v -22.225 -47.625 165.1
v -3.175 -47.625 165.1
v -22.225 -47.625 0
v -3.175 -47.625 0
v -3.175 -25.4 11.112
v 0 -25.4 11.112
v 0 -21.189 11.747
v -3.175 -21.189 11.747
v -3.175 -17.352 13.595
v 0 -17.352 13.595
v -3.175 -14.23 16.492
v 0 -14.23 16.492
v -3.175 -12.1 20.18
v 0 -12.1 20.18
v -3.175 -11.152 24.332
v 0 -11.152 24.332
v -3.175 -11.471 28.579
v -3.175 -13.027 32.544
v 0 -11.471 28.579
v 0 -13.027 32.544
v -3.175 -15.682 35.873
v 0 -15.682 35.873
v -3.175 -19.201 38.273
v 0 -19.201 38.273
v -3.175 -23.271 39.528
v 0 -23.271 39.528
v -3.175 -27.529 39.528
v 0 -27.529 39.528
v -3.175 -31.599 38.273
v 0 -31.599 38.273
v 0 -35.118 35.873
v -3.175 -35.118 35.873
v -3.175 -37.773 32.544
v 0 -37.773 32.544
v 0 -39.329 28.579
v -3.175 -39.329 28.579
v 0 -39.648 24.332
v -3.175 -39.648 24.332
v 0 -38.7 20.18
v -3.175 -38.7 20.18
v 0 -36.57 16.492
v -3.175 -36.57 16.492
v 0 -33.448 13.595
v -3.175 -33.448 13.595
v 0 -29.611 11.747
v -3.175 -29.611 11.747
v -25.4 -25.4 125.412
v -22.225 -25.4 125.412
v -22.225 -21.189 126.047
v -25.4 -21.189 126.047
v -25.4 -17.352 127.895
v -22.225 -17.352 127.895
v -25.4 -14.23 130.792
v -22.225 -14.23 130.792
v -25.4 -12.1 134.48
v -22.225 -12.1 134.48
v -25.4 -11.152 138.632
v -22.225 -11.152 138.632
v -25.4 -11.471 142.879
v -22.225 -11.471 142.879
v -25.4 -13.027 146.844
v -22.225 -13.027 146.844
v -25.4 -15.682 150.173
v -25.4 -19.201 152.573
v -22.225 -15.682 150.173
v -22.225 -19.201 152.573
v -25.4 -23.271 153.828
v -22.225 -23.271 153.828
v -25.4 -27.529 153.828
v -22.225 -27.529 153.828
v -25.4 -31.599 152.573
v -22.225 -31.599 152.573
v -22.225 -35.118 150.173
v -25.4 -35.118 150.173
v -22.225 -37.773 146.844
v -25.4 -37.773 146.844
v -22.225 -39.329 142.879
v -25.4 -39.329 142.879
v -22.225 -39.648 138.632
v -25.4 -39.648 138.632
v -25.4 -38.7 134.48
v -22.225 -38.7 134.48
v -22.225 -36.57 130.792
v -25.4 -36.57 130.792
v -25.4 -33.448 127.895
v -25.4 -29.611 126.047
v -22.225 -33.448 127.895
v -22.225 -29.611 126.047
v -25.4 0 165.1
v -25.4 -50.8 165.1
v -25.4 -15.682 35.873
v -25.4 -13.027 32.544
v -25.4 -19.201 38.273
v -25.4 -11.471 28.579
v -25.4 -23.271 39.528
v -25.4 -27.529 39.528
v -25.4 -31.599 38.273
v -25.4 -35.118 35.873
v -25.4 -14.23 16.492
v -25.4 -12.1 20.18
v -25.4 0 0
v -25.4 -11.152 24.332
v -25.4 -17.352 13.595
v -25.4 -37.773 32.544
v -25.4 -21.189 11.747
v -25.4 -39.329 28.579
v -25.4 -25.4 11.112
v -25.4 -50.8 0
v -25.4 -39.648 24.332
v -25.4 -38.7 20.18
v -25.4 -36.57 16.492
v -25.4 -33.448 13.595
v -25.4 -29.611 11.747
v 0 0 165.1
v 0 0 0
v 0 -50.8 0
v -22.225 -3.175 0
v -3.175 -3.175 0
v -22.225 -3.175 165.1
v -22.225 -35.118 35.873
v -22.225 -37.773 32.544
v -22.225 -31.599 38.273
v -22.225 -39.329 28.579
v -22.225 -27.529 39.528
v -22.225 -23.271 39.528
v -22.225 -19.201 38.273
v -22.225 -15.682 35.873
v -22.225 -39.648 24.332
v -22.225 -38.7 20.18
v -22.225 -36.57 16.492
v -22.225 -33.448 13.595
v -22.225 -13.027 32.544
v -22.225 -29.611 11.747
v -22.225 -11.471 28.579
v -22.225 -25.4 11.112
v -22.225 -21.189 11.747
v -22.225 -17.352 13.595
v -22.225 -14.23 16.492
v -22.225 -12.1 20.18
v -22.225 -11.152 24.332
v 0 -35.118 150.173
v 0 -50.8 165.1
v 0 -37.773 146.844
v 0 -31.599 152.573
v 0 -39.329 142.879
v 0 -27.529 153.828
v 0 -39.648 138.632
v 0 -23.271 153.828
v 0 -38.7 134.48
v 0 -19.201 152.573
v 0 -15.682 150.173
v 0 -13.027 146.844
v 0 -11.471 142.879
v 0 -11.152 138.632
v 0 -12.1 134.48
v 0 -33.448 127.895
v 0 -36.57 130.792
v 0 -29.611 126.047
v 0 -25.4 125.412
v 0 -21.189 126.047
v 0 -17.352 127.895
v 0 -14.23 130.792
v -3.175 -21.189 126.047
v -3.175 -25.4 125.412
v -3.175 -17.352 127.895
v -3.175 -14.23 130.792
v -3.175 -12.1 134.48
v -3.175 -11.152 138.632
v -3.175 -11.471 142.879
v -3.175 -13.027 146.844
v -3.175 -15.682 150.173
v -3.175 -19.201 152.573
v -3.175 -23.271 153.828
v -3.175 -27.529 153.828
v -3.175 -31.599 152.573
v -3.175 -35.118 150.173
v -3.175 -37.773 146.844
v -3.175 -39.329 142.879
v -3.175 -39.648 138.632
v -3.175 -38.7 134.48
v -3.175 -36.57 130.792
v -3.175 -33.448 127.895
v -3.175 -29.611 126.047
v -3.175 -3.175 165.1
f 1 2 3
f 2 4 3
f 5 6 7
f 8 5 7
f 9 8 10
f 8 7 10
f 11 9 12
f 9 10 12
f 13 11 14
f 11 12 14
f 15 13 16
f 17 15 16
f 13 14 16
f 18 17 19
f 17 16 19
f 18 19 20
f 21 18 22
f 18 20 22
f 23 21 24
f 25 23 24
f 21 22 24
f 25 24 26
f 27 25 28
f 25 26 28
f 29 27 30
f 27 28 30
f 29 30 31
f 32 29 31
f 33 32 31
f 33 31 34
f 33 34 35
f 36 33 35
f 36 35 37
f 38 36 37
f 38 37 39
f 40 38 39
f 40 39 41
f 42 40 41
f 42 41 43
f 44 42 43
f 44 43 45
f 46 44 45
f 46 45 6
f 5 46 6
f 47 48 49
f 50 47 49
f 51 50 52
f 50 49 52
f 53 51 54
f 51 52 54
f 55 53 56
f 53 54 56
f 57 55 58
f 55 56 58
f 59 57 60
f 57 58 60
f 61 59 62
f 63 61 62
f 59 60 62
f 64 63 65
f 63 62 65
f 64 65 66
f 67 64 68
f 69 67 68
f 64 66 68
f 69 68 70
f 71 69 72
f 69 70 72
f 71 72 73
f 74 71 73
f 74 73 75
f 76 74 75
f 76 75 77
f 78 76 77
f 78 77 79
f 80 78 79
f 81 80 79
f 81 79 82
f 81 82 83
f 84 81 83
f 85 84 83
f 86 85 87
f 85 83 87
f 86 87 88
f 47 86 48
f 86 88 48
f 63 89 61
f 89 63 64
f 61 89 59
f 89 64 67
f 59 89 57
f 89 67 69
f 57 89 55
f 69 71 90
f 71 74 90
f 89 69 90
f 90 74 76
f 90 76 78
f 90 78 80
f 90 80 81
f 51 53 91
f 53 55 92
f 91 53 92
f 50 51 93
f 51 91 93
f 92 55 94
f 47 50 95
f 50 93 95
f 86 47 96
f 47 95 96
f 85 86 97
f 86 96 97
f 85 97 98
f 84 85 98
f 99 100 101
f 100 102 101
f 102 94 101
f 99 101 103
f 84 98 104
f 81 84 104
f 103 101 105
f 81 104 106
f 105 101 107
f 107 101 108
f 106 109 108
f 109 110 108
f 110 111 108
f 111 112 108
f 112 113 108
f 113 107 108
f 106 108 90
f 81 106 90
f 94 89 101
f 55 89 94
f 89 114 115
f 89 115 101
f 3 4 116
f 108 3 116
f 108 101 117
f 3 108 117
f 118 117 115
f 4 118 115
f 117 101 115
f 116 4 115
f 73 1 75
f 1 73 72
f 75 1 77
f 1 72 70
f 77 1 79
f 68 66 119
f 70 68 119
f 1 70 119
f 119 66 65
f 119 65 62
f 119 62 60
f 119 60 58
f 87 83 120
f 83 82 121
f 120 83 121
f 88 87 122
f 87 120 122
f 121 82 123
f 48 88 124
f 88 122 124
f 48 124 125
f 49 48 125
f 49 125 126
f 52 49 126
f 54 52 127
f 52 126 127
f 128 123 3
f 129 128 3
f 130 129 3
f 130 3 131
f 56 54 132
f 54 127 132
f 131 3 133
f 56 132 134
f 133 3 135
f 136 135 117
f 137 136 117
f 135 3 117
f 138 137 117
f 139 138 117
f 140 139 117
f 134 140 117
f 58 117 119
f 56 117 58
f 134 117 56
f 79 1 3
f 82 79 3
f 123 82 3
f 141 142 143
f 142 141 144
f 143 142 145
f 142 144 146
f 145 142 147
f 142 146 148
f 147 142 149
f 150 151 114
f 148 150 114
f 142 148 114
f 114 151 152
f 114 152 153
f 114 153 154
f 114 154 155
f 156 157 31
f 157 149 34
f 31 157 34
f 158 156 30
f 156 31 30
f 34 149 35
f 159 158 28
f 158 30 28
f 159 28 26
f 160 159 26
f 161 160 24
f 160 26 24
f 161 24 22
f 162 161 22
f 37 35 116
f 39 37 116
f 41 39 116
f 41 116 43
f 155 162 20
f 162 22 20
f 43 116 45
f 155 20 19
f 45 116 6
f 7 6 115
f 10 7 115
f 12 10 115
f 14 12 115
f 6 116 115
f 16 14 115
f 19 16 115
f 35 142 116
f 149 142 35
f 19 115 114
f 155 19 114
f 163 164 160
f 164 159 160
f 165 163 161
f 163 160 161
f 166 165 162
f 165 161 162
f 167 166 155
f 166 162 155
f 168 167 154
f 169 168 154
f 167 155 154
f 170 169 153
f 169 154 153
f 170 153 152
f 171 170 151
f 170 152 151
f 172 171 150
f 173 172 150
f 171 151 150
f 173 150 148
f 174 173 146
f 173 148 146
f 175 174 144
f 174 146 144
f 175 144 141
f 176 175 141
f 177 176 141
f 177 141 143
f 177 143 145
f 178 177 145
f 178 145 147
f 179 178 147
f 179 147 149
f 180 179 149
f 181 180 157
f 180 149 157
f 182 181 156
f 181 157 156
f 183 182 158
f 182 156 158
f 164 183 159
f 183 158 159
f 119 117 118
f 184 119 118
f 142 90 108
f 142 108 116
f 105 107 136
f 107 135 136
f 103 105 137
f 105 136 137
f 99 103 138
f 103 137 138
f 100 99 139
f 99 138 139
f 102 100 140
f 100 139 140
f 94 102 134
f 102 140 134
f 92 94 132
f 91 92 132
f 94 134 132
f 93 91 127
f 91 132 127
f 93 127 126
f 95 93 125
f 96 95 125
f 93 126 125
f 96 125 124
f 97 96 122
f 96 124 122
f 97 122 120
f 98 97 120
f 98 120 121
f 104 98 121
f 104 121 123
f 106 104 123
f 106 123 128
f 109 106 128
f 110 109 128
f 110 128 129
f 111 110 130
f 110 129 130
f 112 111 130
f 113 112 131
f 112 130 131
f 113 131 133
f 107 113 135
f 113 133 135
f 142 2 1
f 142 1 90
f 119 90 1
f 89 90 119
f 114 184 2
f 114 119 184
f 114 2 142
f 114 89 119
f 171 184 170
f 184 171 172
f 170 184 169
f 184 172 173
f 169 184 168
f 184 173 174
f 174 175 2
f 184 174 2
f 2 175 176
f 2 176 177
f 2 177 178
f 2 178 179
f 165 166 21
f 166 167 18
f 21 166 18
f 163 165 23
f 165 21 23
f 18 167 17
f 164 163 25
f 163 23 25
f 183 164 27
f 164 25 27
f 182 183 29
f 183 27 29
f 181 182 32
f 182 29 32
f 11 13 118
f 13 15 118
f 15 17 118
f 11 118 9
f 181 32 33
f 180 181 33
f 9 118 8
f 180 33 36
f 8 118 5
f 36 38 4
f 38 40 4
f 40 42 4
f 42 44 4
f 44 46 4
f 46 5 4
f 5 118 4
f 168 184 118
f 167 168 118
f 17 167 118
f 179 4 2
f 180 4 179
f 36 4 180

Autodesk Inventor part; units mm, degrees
ref_plane "YZ Plane" through (0, 0, 0) normal (1, 0, 0) x (0, 1, 0)
ref_plane "XZ Plane" through (0, 0, 0) normal (0, 1, 0) x (-1, 0, 0)
ref_plane "XY Plane" through (0, 0, 0) normal (0, 0, 1) x (1, 0, 0)
sketch "Sketch1" plane through (0, 0, 0) normal (0, 0, 1) x (1, 0, 0)
  line L0 (0, 0) -> (-25.4, 0)
  line L1 (-25.4, 0) -> (-25.4, -50.8)
  line L2 (-25.4, -50.8) -> (0, -50.8)
  line L3 (0, -50.8) -> (0, 0)
  line L4 (-22.225, -3.175) -> (-3.175, -3.175)
  line L5 (-3.175, -3.175) -> (-3.175, -47.625)
  line L6 (-3.175, -47.625) -> (-22.225, -47.625)
  line L7 (-22.225, -47.625) -> (-22.225, -3.175)
  dimension "d0" = 25.4
  dimension "d1" = 50.8
  dimension "d2" = 3.175
extrude "Extrusion1" add sketch "Sketch1" along normal blind 165.1
sketch "Sketch2" plane through (0, -50.8, 0) normal (1, 0, 0) x (0, 0, -1)
  circle A0 centre (-25.4, 25.4) radius 14.2875
  line L0 (0, 0) -> (0, 50.8) projected
  line L1 (0, 50.8) -> (-165.1, 50.8) projected
  circle A1 centre (-139.7, 25.4) radius 14.2875
  line L2 (0, 0) -> (-165.1, 0) projected
  line L3 (-165.1, 0) -> (-165.1, 50.8) projected
  dimension "d5" = 28.575
  dimension "d6" = 25.4
  dimension "d7" = 25.4
  dimension "d8" = 28.575
  dimension "d9" = 25.4
  dimension "d10" = 25.4
extrude "Extrusion2" cut sketch "Sketch2" against normal blind 177.8 contours A0 | A1
properties part number "intake srms"
